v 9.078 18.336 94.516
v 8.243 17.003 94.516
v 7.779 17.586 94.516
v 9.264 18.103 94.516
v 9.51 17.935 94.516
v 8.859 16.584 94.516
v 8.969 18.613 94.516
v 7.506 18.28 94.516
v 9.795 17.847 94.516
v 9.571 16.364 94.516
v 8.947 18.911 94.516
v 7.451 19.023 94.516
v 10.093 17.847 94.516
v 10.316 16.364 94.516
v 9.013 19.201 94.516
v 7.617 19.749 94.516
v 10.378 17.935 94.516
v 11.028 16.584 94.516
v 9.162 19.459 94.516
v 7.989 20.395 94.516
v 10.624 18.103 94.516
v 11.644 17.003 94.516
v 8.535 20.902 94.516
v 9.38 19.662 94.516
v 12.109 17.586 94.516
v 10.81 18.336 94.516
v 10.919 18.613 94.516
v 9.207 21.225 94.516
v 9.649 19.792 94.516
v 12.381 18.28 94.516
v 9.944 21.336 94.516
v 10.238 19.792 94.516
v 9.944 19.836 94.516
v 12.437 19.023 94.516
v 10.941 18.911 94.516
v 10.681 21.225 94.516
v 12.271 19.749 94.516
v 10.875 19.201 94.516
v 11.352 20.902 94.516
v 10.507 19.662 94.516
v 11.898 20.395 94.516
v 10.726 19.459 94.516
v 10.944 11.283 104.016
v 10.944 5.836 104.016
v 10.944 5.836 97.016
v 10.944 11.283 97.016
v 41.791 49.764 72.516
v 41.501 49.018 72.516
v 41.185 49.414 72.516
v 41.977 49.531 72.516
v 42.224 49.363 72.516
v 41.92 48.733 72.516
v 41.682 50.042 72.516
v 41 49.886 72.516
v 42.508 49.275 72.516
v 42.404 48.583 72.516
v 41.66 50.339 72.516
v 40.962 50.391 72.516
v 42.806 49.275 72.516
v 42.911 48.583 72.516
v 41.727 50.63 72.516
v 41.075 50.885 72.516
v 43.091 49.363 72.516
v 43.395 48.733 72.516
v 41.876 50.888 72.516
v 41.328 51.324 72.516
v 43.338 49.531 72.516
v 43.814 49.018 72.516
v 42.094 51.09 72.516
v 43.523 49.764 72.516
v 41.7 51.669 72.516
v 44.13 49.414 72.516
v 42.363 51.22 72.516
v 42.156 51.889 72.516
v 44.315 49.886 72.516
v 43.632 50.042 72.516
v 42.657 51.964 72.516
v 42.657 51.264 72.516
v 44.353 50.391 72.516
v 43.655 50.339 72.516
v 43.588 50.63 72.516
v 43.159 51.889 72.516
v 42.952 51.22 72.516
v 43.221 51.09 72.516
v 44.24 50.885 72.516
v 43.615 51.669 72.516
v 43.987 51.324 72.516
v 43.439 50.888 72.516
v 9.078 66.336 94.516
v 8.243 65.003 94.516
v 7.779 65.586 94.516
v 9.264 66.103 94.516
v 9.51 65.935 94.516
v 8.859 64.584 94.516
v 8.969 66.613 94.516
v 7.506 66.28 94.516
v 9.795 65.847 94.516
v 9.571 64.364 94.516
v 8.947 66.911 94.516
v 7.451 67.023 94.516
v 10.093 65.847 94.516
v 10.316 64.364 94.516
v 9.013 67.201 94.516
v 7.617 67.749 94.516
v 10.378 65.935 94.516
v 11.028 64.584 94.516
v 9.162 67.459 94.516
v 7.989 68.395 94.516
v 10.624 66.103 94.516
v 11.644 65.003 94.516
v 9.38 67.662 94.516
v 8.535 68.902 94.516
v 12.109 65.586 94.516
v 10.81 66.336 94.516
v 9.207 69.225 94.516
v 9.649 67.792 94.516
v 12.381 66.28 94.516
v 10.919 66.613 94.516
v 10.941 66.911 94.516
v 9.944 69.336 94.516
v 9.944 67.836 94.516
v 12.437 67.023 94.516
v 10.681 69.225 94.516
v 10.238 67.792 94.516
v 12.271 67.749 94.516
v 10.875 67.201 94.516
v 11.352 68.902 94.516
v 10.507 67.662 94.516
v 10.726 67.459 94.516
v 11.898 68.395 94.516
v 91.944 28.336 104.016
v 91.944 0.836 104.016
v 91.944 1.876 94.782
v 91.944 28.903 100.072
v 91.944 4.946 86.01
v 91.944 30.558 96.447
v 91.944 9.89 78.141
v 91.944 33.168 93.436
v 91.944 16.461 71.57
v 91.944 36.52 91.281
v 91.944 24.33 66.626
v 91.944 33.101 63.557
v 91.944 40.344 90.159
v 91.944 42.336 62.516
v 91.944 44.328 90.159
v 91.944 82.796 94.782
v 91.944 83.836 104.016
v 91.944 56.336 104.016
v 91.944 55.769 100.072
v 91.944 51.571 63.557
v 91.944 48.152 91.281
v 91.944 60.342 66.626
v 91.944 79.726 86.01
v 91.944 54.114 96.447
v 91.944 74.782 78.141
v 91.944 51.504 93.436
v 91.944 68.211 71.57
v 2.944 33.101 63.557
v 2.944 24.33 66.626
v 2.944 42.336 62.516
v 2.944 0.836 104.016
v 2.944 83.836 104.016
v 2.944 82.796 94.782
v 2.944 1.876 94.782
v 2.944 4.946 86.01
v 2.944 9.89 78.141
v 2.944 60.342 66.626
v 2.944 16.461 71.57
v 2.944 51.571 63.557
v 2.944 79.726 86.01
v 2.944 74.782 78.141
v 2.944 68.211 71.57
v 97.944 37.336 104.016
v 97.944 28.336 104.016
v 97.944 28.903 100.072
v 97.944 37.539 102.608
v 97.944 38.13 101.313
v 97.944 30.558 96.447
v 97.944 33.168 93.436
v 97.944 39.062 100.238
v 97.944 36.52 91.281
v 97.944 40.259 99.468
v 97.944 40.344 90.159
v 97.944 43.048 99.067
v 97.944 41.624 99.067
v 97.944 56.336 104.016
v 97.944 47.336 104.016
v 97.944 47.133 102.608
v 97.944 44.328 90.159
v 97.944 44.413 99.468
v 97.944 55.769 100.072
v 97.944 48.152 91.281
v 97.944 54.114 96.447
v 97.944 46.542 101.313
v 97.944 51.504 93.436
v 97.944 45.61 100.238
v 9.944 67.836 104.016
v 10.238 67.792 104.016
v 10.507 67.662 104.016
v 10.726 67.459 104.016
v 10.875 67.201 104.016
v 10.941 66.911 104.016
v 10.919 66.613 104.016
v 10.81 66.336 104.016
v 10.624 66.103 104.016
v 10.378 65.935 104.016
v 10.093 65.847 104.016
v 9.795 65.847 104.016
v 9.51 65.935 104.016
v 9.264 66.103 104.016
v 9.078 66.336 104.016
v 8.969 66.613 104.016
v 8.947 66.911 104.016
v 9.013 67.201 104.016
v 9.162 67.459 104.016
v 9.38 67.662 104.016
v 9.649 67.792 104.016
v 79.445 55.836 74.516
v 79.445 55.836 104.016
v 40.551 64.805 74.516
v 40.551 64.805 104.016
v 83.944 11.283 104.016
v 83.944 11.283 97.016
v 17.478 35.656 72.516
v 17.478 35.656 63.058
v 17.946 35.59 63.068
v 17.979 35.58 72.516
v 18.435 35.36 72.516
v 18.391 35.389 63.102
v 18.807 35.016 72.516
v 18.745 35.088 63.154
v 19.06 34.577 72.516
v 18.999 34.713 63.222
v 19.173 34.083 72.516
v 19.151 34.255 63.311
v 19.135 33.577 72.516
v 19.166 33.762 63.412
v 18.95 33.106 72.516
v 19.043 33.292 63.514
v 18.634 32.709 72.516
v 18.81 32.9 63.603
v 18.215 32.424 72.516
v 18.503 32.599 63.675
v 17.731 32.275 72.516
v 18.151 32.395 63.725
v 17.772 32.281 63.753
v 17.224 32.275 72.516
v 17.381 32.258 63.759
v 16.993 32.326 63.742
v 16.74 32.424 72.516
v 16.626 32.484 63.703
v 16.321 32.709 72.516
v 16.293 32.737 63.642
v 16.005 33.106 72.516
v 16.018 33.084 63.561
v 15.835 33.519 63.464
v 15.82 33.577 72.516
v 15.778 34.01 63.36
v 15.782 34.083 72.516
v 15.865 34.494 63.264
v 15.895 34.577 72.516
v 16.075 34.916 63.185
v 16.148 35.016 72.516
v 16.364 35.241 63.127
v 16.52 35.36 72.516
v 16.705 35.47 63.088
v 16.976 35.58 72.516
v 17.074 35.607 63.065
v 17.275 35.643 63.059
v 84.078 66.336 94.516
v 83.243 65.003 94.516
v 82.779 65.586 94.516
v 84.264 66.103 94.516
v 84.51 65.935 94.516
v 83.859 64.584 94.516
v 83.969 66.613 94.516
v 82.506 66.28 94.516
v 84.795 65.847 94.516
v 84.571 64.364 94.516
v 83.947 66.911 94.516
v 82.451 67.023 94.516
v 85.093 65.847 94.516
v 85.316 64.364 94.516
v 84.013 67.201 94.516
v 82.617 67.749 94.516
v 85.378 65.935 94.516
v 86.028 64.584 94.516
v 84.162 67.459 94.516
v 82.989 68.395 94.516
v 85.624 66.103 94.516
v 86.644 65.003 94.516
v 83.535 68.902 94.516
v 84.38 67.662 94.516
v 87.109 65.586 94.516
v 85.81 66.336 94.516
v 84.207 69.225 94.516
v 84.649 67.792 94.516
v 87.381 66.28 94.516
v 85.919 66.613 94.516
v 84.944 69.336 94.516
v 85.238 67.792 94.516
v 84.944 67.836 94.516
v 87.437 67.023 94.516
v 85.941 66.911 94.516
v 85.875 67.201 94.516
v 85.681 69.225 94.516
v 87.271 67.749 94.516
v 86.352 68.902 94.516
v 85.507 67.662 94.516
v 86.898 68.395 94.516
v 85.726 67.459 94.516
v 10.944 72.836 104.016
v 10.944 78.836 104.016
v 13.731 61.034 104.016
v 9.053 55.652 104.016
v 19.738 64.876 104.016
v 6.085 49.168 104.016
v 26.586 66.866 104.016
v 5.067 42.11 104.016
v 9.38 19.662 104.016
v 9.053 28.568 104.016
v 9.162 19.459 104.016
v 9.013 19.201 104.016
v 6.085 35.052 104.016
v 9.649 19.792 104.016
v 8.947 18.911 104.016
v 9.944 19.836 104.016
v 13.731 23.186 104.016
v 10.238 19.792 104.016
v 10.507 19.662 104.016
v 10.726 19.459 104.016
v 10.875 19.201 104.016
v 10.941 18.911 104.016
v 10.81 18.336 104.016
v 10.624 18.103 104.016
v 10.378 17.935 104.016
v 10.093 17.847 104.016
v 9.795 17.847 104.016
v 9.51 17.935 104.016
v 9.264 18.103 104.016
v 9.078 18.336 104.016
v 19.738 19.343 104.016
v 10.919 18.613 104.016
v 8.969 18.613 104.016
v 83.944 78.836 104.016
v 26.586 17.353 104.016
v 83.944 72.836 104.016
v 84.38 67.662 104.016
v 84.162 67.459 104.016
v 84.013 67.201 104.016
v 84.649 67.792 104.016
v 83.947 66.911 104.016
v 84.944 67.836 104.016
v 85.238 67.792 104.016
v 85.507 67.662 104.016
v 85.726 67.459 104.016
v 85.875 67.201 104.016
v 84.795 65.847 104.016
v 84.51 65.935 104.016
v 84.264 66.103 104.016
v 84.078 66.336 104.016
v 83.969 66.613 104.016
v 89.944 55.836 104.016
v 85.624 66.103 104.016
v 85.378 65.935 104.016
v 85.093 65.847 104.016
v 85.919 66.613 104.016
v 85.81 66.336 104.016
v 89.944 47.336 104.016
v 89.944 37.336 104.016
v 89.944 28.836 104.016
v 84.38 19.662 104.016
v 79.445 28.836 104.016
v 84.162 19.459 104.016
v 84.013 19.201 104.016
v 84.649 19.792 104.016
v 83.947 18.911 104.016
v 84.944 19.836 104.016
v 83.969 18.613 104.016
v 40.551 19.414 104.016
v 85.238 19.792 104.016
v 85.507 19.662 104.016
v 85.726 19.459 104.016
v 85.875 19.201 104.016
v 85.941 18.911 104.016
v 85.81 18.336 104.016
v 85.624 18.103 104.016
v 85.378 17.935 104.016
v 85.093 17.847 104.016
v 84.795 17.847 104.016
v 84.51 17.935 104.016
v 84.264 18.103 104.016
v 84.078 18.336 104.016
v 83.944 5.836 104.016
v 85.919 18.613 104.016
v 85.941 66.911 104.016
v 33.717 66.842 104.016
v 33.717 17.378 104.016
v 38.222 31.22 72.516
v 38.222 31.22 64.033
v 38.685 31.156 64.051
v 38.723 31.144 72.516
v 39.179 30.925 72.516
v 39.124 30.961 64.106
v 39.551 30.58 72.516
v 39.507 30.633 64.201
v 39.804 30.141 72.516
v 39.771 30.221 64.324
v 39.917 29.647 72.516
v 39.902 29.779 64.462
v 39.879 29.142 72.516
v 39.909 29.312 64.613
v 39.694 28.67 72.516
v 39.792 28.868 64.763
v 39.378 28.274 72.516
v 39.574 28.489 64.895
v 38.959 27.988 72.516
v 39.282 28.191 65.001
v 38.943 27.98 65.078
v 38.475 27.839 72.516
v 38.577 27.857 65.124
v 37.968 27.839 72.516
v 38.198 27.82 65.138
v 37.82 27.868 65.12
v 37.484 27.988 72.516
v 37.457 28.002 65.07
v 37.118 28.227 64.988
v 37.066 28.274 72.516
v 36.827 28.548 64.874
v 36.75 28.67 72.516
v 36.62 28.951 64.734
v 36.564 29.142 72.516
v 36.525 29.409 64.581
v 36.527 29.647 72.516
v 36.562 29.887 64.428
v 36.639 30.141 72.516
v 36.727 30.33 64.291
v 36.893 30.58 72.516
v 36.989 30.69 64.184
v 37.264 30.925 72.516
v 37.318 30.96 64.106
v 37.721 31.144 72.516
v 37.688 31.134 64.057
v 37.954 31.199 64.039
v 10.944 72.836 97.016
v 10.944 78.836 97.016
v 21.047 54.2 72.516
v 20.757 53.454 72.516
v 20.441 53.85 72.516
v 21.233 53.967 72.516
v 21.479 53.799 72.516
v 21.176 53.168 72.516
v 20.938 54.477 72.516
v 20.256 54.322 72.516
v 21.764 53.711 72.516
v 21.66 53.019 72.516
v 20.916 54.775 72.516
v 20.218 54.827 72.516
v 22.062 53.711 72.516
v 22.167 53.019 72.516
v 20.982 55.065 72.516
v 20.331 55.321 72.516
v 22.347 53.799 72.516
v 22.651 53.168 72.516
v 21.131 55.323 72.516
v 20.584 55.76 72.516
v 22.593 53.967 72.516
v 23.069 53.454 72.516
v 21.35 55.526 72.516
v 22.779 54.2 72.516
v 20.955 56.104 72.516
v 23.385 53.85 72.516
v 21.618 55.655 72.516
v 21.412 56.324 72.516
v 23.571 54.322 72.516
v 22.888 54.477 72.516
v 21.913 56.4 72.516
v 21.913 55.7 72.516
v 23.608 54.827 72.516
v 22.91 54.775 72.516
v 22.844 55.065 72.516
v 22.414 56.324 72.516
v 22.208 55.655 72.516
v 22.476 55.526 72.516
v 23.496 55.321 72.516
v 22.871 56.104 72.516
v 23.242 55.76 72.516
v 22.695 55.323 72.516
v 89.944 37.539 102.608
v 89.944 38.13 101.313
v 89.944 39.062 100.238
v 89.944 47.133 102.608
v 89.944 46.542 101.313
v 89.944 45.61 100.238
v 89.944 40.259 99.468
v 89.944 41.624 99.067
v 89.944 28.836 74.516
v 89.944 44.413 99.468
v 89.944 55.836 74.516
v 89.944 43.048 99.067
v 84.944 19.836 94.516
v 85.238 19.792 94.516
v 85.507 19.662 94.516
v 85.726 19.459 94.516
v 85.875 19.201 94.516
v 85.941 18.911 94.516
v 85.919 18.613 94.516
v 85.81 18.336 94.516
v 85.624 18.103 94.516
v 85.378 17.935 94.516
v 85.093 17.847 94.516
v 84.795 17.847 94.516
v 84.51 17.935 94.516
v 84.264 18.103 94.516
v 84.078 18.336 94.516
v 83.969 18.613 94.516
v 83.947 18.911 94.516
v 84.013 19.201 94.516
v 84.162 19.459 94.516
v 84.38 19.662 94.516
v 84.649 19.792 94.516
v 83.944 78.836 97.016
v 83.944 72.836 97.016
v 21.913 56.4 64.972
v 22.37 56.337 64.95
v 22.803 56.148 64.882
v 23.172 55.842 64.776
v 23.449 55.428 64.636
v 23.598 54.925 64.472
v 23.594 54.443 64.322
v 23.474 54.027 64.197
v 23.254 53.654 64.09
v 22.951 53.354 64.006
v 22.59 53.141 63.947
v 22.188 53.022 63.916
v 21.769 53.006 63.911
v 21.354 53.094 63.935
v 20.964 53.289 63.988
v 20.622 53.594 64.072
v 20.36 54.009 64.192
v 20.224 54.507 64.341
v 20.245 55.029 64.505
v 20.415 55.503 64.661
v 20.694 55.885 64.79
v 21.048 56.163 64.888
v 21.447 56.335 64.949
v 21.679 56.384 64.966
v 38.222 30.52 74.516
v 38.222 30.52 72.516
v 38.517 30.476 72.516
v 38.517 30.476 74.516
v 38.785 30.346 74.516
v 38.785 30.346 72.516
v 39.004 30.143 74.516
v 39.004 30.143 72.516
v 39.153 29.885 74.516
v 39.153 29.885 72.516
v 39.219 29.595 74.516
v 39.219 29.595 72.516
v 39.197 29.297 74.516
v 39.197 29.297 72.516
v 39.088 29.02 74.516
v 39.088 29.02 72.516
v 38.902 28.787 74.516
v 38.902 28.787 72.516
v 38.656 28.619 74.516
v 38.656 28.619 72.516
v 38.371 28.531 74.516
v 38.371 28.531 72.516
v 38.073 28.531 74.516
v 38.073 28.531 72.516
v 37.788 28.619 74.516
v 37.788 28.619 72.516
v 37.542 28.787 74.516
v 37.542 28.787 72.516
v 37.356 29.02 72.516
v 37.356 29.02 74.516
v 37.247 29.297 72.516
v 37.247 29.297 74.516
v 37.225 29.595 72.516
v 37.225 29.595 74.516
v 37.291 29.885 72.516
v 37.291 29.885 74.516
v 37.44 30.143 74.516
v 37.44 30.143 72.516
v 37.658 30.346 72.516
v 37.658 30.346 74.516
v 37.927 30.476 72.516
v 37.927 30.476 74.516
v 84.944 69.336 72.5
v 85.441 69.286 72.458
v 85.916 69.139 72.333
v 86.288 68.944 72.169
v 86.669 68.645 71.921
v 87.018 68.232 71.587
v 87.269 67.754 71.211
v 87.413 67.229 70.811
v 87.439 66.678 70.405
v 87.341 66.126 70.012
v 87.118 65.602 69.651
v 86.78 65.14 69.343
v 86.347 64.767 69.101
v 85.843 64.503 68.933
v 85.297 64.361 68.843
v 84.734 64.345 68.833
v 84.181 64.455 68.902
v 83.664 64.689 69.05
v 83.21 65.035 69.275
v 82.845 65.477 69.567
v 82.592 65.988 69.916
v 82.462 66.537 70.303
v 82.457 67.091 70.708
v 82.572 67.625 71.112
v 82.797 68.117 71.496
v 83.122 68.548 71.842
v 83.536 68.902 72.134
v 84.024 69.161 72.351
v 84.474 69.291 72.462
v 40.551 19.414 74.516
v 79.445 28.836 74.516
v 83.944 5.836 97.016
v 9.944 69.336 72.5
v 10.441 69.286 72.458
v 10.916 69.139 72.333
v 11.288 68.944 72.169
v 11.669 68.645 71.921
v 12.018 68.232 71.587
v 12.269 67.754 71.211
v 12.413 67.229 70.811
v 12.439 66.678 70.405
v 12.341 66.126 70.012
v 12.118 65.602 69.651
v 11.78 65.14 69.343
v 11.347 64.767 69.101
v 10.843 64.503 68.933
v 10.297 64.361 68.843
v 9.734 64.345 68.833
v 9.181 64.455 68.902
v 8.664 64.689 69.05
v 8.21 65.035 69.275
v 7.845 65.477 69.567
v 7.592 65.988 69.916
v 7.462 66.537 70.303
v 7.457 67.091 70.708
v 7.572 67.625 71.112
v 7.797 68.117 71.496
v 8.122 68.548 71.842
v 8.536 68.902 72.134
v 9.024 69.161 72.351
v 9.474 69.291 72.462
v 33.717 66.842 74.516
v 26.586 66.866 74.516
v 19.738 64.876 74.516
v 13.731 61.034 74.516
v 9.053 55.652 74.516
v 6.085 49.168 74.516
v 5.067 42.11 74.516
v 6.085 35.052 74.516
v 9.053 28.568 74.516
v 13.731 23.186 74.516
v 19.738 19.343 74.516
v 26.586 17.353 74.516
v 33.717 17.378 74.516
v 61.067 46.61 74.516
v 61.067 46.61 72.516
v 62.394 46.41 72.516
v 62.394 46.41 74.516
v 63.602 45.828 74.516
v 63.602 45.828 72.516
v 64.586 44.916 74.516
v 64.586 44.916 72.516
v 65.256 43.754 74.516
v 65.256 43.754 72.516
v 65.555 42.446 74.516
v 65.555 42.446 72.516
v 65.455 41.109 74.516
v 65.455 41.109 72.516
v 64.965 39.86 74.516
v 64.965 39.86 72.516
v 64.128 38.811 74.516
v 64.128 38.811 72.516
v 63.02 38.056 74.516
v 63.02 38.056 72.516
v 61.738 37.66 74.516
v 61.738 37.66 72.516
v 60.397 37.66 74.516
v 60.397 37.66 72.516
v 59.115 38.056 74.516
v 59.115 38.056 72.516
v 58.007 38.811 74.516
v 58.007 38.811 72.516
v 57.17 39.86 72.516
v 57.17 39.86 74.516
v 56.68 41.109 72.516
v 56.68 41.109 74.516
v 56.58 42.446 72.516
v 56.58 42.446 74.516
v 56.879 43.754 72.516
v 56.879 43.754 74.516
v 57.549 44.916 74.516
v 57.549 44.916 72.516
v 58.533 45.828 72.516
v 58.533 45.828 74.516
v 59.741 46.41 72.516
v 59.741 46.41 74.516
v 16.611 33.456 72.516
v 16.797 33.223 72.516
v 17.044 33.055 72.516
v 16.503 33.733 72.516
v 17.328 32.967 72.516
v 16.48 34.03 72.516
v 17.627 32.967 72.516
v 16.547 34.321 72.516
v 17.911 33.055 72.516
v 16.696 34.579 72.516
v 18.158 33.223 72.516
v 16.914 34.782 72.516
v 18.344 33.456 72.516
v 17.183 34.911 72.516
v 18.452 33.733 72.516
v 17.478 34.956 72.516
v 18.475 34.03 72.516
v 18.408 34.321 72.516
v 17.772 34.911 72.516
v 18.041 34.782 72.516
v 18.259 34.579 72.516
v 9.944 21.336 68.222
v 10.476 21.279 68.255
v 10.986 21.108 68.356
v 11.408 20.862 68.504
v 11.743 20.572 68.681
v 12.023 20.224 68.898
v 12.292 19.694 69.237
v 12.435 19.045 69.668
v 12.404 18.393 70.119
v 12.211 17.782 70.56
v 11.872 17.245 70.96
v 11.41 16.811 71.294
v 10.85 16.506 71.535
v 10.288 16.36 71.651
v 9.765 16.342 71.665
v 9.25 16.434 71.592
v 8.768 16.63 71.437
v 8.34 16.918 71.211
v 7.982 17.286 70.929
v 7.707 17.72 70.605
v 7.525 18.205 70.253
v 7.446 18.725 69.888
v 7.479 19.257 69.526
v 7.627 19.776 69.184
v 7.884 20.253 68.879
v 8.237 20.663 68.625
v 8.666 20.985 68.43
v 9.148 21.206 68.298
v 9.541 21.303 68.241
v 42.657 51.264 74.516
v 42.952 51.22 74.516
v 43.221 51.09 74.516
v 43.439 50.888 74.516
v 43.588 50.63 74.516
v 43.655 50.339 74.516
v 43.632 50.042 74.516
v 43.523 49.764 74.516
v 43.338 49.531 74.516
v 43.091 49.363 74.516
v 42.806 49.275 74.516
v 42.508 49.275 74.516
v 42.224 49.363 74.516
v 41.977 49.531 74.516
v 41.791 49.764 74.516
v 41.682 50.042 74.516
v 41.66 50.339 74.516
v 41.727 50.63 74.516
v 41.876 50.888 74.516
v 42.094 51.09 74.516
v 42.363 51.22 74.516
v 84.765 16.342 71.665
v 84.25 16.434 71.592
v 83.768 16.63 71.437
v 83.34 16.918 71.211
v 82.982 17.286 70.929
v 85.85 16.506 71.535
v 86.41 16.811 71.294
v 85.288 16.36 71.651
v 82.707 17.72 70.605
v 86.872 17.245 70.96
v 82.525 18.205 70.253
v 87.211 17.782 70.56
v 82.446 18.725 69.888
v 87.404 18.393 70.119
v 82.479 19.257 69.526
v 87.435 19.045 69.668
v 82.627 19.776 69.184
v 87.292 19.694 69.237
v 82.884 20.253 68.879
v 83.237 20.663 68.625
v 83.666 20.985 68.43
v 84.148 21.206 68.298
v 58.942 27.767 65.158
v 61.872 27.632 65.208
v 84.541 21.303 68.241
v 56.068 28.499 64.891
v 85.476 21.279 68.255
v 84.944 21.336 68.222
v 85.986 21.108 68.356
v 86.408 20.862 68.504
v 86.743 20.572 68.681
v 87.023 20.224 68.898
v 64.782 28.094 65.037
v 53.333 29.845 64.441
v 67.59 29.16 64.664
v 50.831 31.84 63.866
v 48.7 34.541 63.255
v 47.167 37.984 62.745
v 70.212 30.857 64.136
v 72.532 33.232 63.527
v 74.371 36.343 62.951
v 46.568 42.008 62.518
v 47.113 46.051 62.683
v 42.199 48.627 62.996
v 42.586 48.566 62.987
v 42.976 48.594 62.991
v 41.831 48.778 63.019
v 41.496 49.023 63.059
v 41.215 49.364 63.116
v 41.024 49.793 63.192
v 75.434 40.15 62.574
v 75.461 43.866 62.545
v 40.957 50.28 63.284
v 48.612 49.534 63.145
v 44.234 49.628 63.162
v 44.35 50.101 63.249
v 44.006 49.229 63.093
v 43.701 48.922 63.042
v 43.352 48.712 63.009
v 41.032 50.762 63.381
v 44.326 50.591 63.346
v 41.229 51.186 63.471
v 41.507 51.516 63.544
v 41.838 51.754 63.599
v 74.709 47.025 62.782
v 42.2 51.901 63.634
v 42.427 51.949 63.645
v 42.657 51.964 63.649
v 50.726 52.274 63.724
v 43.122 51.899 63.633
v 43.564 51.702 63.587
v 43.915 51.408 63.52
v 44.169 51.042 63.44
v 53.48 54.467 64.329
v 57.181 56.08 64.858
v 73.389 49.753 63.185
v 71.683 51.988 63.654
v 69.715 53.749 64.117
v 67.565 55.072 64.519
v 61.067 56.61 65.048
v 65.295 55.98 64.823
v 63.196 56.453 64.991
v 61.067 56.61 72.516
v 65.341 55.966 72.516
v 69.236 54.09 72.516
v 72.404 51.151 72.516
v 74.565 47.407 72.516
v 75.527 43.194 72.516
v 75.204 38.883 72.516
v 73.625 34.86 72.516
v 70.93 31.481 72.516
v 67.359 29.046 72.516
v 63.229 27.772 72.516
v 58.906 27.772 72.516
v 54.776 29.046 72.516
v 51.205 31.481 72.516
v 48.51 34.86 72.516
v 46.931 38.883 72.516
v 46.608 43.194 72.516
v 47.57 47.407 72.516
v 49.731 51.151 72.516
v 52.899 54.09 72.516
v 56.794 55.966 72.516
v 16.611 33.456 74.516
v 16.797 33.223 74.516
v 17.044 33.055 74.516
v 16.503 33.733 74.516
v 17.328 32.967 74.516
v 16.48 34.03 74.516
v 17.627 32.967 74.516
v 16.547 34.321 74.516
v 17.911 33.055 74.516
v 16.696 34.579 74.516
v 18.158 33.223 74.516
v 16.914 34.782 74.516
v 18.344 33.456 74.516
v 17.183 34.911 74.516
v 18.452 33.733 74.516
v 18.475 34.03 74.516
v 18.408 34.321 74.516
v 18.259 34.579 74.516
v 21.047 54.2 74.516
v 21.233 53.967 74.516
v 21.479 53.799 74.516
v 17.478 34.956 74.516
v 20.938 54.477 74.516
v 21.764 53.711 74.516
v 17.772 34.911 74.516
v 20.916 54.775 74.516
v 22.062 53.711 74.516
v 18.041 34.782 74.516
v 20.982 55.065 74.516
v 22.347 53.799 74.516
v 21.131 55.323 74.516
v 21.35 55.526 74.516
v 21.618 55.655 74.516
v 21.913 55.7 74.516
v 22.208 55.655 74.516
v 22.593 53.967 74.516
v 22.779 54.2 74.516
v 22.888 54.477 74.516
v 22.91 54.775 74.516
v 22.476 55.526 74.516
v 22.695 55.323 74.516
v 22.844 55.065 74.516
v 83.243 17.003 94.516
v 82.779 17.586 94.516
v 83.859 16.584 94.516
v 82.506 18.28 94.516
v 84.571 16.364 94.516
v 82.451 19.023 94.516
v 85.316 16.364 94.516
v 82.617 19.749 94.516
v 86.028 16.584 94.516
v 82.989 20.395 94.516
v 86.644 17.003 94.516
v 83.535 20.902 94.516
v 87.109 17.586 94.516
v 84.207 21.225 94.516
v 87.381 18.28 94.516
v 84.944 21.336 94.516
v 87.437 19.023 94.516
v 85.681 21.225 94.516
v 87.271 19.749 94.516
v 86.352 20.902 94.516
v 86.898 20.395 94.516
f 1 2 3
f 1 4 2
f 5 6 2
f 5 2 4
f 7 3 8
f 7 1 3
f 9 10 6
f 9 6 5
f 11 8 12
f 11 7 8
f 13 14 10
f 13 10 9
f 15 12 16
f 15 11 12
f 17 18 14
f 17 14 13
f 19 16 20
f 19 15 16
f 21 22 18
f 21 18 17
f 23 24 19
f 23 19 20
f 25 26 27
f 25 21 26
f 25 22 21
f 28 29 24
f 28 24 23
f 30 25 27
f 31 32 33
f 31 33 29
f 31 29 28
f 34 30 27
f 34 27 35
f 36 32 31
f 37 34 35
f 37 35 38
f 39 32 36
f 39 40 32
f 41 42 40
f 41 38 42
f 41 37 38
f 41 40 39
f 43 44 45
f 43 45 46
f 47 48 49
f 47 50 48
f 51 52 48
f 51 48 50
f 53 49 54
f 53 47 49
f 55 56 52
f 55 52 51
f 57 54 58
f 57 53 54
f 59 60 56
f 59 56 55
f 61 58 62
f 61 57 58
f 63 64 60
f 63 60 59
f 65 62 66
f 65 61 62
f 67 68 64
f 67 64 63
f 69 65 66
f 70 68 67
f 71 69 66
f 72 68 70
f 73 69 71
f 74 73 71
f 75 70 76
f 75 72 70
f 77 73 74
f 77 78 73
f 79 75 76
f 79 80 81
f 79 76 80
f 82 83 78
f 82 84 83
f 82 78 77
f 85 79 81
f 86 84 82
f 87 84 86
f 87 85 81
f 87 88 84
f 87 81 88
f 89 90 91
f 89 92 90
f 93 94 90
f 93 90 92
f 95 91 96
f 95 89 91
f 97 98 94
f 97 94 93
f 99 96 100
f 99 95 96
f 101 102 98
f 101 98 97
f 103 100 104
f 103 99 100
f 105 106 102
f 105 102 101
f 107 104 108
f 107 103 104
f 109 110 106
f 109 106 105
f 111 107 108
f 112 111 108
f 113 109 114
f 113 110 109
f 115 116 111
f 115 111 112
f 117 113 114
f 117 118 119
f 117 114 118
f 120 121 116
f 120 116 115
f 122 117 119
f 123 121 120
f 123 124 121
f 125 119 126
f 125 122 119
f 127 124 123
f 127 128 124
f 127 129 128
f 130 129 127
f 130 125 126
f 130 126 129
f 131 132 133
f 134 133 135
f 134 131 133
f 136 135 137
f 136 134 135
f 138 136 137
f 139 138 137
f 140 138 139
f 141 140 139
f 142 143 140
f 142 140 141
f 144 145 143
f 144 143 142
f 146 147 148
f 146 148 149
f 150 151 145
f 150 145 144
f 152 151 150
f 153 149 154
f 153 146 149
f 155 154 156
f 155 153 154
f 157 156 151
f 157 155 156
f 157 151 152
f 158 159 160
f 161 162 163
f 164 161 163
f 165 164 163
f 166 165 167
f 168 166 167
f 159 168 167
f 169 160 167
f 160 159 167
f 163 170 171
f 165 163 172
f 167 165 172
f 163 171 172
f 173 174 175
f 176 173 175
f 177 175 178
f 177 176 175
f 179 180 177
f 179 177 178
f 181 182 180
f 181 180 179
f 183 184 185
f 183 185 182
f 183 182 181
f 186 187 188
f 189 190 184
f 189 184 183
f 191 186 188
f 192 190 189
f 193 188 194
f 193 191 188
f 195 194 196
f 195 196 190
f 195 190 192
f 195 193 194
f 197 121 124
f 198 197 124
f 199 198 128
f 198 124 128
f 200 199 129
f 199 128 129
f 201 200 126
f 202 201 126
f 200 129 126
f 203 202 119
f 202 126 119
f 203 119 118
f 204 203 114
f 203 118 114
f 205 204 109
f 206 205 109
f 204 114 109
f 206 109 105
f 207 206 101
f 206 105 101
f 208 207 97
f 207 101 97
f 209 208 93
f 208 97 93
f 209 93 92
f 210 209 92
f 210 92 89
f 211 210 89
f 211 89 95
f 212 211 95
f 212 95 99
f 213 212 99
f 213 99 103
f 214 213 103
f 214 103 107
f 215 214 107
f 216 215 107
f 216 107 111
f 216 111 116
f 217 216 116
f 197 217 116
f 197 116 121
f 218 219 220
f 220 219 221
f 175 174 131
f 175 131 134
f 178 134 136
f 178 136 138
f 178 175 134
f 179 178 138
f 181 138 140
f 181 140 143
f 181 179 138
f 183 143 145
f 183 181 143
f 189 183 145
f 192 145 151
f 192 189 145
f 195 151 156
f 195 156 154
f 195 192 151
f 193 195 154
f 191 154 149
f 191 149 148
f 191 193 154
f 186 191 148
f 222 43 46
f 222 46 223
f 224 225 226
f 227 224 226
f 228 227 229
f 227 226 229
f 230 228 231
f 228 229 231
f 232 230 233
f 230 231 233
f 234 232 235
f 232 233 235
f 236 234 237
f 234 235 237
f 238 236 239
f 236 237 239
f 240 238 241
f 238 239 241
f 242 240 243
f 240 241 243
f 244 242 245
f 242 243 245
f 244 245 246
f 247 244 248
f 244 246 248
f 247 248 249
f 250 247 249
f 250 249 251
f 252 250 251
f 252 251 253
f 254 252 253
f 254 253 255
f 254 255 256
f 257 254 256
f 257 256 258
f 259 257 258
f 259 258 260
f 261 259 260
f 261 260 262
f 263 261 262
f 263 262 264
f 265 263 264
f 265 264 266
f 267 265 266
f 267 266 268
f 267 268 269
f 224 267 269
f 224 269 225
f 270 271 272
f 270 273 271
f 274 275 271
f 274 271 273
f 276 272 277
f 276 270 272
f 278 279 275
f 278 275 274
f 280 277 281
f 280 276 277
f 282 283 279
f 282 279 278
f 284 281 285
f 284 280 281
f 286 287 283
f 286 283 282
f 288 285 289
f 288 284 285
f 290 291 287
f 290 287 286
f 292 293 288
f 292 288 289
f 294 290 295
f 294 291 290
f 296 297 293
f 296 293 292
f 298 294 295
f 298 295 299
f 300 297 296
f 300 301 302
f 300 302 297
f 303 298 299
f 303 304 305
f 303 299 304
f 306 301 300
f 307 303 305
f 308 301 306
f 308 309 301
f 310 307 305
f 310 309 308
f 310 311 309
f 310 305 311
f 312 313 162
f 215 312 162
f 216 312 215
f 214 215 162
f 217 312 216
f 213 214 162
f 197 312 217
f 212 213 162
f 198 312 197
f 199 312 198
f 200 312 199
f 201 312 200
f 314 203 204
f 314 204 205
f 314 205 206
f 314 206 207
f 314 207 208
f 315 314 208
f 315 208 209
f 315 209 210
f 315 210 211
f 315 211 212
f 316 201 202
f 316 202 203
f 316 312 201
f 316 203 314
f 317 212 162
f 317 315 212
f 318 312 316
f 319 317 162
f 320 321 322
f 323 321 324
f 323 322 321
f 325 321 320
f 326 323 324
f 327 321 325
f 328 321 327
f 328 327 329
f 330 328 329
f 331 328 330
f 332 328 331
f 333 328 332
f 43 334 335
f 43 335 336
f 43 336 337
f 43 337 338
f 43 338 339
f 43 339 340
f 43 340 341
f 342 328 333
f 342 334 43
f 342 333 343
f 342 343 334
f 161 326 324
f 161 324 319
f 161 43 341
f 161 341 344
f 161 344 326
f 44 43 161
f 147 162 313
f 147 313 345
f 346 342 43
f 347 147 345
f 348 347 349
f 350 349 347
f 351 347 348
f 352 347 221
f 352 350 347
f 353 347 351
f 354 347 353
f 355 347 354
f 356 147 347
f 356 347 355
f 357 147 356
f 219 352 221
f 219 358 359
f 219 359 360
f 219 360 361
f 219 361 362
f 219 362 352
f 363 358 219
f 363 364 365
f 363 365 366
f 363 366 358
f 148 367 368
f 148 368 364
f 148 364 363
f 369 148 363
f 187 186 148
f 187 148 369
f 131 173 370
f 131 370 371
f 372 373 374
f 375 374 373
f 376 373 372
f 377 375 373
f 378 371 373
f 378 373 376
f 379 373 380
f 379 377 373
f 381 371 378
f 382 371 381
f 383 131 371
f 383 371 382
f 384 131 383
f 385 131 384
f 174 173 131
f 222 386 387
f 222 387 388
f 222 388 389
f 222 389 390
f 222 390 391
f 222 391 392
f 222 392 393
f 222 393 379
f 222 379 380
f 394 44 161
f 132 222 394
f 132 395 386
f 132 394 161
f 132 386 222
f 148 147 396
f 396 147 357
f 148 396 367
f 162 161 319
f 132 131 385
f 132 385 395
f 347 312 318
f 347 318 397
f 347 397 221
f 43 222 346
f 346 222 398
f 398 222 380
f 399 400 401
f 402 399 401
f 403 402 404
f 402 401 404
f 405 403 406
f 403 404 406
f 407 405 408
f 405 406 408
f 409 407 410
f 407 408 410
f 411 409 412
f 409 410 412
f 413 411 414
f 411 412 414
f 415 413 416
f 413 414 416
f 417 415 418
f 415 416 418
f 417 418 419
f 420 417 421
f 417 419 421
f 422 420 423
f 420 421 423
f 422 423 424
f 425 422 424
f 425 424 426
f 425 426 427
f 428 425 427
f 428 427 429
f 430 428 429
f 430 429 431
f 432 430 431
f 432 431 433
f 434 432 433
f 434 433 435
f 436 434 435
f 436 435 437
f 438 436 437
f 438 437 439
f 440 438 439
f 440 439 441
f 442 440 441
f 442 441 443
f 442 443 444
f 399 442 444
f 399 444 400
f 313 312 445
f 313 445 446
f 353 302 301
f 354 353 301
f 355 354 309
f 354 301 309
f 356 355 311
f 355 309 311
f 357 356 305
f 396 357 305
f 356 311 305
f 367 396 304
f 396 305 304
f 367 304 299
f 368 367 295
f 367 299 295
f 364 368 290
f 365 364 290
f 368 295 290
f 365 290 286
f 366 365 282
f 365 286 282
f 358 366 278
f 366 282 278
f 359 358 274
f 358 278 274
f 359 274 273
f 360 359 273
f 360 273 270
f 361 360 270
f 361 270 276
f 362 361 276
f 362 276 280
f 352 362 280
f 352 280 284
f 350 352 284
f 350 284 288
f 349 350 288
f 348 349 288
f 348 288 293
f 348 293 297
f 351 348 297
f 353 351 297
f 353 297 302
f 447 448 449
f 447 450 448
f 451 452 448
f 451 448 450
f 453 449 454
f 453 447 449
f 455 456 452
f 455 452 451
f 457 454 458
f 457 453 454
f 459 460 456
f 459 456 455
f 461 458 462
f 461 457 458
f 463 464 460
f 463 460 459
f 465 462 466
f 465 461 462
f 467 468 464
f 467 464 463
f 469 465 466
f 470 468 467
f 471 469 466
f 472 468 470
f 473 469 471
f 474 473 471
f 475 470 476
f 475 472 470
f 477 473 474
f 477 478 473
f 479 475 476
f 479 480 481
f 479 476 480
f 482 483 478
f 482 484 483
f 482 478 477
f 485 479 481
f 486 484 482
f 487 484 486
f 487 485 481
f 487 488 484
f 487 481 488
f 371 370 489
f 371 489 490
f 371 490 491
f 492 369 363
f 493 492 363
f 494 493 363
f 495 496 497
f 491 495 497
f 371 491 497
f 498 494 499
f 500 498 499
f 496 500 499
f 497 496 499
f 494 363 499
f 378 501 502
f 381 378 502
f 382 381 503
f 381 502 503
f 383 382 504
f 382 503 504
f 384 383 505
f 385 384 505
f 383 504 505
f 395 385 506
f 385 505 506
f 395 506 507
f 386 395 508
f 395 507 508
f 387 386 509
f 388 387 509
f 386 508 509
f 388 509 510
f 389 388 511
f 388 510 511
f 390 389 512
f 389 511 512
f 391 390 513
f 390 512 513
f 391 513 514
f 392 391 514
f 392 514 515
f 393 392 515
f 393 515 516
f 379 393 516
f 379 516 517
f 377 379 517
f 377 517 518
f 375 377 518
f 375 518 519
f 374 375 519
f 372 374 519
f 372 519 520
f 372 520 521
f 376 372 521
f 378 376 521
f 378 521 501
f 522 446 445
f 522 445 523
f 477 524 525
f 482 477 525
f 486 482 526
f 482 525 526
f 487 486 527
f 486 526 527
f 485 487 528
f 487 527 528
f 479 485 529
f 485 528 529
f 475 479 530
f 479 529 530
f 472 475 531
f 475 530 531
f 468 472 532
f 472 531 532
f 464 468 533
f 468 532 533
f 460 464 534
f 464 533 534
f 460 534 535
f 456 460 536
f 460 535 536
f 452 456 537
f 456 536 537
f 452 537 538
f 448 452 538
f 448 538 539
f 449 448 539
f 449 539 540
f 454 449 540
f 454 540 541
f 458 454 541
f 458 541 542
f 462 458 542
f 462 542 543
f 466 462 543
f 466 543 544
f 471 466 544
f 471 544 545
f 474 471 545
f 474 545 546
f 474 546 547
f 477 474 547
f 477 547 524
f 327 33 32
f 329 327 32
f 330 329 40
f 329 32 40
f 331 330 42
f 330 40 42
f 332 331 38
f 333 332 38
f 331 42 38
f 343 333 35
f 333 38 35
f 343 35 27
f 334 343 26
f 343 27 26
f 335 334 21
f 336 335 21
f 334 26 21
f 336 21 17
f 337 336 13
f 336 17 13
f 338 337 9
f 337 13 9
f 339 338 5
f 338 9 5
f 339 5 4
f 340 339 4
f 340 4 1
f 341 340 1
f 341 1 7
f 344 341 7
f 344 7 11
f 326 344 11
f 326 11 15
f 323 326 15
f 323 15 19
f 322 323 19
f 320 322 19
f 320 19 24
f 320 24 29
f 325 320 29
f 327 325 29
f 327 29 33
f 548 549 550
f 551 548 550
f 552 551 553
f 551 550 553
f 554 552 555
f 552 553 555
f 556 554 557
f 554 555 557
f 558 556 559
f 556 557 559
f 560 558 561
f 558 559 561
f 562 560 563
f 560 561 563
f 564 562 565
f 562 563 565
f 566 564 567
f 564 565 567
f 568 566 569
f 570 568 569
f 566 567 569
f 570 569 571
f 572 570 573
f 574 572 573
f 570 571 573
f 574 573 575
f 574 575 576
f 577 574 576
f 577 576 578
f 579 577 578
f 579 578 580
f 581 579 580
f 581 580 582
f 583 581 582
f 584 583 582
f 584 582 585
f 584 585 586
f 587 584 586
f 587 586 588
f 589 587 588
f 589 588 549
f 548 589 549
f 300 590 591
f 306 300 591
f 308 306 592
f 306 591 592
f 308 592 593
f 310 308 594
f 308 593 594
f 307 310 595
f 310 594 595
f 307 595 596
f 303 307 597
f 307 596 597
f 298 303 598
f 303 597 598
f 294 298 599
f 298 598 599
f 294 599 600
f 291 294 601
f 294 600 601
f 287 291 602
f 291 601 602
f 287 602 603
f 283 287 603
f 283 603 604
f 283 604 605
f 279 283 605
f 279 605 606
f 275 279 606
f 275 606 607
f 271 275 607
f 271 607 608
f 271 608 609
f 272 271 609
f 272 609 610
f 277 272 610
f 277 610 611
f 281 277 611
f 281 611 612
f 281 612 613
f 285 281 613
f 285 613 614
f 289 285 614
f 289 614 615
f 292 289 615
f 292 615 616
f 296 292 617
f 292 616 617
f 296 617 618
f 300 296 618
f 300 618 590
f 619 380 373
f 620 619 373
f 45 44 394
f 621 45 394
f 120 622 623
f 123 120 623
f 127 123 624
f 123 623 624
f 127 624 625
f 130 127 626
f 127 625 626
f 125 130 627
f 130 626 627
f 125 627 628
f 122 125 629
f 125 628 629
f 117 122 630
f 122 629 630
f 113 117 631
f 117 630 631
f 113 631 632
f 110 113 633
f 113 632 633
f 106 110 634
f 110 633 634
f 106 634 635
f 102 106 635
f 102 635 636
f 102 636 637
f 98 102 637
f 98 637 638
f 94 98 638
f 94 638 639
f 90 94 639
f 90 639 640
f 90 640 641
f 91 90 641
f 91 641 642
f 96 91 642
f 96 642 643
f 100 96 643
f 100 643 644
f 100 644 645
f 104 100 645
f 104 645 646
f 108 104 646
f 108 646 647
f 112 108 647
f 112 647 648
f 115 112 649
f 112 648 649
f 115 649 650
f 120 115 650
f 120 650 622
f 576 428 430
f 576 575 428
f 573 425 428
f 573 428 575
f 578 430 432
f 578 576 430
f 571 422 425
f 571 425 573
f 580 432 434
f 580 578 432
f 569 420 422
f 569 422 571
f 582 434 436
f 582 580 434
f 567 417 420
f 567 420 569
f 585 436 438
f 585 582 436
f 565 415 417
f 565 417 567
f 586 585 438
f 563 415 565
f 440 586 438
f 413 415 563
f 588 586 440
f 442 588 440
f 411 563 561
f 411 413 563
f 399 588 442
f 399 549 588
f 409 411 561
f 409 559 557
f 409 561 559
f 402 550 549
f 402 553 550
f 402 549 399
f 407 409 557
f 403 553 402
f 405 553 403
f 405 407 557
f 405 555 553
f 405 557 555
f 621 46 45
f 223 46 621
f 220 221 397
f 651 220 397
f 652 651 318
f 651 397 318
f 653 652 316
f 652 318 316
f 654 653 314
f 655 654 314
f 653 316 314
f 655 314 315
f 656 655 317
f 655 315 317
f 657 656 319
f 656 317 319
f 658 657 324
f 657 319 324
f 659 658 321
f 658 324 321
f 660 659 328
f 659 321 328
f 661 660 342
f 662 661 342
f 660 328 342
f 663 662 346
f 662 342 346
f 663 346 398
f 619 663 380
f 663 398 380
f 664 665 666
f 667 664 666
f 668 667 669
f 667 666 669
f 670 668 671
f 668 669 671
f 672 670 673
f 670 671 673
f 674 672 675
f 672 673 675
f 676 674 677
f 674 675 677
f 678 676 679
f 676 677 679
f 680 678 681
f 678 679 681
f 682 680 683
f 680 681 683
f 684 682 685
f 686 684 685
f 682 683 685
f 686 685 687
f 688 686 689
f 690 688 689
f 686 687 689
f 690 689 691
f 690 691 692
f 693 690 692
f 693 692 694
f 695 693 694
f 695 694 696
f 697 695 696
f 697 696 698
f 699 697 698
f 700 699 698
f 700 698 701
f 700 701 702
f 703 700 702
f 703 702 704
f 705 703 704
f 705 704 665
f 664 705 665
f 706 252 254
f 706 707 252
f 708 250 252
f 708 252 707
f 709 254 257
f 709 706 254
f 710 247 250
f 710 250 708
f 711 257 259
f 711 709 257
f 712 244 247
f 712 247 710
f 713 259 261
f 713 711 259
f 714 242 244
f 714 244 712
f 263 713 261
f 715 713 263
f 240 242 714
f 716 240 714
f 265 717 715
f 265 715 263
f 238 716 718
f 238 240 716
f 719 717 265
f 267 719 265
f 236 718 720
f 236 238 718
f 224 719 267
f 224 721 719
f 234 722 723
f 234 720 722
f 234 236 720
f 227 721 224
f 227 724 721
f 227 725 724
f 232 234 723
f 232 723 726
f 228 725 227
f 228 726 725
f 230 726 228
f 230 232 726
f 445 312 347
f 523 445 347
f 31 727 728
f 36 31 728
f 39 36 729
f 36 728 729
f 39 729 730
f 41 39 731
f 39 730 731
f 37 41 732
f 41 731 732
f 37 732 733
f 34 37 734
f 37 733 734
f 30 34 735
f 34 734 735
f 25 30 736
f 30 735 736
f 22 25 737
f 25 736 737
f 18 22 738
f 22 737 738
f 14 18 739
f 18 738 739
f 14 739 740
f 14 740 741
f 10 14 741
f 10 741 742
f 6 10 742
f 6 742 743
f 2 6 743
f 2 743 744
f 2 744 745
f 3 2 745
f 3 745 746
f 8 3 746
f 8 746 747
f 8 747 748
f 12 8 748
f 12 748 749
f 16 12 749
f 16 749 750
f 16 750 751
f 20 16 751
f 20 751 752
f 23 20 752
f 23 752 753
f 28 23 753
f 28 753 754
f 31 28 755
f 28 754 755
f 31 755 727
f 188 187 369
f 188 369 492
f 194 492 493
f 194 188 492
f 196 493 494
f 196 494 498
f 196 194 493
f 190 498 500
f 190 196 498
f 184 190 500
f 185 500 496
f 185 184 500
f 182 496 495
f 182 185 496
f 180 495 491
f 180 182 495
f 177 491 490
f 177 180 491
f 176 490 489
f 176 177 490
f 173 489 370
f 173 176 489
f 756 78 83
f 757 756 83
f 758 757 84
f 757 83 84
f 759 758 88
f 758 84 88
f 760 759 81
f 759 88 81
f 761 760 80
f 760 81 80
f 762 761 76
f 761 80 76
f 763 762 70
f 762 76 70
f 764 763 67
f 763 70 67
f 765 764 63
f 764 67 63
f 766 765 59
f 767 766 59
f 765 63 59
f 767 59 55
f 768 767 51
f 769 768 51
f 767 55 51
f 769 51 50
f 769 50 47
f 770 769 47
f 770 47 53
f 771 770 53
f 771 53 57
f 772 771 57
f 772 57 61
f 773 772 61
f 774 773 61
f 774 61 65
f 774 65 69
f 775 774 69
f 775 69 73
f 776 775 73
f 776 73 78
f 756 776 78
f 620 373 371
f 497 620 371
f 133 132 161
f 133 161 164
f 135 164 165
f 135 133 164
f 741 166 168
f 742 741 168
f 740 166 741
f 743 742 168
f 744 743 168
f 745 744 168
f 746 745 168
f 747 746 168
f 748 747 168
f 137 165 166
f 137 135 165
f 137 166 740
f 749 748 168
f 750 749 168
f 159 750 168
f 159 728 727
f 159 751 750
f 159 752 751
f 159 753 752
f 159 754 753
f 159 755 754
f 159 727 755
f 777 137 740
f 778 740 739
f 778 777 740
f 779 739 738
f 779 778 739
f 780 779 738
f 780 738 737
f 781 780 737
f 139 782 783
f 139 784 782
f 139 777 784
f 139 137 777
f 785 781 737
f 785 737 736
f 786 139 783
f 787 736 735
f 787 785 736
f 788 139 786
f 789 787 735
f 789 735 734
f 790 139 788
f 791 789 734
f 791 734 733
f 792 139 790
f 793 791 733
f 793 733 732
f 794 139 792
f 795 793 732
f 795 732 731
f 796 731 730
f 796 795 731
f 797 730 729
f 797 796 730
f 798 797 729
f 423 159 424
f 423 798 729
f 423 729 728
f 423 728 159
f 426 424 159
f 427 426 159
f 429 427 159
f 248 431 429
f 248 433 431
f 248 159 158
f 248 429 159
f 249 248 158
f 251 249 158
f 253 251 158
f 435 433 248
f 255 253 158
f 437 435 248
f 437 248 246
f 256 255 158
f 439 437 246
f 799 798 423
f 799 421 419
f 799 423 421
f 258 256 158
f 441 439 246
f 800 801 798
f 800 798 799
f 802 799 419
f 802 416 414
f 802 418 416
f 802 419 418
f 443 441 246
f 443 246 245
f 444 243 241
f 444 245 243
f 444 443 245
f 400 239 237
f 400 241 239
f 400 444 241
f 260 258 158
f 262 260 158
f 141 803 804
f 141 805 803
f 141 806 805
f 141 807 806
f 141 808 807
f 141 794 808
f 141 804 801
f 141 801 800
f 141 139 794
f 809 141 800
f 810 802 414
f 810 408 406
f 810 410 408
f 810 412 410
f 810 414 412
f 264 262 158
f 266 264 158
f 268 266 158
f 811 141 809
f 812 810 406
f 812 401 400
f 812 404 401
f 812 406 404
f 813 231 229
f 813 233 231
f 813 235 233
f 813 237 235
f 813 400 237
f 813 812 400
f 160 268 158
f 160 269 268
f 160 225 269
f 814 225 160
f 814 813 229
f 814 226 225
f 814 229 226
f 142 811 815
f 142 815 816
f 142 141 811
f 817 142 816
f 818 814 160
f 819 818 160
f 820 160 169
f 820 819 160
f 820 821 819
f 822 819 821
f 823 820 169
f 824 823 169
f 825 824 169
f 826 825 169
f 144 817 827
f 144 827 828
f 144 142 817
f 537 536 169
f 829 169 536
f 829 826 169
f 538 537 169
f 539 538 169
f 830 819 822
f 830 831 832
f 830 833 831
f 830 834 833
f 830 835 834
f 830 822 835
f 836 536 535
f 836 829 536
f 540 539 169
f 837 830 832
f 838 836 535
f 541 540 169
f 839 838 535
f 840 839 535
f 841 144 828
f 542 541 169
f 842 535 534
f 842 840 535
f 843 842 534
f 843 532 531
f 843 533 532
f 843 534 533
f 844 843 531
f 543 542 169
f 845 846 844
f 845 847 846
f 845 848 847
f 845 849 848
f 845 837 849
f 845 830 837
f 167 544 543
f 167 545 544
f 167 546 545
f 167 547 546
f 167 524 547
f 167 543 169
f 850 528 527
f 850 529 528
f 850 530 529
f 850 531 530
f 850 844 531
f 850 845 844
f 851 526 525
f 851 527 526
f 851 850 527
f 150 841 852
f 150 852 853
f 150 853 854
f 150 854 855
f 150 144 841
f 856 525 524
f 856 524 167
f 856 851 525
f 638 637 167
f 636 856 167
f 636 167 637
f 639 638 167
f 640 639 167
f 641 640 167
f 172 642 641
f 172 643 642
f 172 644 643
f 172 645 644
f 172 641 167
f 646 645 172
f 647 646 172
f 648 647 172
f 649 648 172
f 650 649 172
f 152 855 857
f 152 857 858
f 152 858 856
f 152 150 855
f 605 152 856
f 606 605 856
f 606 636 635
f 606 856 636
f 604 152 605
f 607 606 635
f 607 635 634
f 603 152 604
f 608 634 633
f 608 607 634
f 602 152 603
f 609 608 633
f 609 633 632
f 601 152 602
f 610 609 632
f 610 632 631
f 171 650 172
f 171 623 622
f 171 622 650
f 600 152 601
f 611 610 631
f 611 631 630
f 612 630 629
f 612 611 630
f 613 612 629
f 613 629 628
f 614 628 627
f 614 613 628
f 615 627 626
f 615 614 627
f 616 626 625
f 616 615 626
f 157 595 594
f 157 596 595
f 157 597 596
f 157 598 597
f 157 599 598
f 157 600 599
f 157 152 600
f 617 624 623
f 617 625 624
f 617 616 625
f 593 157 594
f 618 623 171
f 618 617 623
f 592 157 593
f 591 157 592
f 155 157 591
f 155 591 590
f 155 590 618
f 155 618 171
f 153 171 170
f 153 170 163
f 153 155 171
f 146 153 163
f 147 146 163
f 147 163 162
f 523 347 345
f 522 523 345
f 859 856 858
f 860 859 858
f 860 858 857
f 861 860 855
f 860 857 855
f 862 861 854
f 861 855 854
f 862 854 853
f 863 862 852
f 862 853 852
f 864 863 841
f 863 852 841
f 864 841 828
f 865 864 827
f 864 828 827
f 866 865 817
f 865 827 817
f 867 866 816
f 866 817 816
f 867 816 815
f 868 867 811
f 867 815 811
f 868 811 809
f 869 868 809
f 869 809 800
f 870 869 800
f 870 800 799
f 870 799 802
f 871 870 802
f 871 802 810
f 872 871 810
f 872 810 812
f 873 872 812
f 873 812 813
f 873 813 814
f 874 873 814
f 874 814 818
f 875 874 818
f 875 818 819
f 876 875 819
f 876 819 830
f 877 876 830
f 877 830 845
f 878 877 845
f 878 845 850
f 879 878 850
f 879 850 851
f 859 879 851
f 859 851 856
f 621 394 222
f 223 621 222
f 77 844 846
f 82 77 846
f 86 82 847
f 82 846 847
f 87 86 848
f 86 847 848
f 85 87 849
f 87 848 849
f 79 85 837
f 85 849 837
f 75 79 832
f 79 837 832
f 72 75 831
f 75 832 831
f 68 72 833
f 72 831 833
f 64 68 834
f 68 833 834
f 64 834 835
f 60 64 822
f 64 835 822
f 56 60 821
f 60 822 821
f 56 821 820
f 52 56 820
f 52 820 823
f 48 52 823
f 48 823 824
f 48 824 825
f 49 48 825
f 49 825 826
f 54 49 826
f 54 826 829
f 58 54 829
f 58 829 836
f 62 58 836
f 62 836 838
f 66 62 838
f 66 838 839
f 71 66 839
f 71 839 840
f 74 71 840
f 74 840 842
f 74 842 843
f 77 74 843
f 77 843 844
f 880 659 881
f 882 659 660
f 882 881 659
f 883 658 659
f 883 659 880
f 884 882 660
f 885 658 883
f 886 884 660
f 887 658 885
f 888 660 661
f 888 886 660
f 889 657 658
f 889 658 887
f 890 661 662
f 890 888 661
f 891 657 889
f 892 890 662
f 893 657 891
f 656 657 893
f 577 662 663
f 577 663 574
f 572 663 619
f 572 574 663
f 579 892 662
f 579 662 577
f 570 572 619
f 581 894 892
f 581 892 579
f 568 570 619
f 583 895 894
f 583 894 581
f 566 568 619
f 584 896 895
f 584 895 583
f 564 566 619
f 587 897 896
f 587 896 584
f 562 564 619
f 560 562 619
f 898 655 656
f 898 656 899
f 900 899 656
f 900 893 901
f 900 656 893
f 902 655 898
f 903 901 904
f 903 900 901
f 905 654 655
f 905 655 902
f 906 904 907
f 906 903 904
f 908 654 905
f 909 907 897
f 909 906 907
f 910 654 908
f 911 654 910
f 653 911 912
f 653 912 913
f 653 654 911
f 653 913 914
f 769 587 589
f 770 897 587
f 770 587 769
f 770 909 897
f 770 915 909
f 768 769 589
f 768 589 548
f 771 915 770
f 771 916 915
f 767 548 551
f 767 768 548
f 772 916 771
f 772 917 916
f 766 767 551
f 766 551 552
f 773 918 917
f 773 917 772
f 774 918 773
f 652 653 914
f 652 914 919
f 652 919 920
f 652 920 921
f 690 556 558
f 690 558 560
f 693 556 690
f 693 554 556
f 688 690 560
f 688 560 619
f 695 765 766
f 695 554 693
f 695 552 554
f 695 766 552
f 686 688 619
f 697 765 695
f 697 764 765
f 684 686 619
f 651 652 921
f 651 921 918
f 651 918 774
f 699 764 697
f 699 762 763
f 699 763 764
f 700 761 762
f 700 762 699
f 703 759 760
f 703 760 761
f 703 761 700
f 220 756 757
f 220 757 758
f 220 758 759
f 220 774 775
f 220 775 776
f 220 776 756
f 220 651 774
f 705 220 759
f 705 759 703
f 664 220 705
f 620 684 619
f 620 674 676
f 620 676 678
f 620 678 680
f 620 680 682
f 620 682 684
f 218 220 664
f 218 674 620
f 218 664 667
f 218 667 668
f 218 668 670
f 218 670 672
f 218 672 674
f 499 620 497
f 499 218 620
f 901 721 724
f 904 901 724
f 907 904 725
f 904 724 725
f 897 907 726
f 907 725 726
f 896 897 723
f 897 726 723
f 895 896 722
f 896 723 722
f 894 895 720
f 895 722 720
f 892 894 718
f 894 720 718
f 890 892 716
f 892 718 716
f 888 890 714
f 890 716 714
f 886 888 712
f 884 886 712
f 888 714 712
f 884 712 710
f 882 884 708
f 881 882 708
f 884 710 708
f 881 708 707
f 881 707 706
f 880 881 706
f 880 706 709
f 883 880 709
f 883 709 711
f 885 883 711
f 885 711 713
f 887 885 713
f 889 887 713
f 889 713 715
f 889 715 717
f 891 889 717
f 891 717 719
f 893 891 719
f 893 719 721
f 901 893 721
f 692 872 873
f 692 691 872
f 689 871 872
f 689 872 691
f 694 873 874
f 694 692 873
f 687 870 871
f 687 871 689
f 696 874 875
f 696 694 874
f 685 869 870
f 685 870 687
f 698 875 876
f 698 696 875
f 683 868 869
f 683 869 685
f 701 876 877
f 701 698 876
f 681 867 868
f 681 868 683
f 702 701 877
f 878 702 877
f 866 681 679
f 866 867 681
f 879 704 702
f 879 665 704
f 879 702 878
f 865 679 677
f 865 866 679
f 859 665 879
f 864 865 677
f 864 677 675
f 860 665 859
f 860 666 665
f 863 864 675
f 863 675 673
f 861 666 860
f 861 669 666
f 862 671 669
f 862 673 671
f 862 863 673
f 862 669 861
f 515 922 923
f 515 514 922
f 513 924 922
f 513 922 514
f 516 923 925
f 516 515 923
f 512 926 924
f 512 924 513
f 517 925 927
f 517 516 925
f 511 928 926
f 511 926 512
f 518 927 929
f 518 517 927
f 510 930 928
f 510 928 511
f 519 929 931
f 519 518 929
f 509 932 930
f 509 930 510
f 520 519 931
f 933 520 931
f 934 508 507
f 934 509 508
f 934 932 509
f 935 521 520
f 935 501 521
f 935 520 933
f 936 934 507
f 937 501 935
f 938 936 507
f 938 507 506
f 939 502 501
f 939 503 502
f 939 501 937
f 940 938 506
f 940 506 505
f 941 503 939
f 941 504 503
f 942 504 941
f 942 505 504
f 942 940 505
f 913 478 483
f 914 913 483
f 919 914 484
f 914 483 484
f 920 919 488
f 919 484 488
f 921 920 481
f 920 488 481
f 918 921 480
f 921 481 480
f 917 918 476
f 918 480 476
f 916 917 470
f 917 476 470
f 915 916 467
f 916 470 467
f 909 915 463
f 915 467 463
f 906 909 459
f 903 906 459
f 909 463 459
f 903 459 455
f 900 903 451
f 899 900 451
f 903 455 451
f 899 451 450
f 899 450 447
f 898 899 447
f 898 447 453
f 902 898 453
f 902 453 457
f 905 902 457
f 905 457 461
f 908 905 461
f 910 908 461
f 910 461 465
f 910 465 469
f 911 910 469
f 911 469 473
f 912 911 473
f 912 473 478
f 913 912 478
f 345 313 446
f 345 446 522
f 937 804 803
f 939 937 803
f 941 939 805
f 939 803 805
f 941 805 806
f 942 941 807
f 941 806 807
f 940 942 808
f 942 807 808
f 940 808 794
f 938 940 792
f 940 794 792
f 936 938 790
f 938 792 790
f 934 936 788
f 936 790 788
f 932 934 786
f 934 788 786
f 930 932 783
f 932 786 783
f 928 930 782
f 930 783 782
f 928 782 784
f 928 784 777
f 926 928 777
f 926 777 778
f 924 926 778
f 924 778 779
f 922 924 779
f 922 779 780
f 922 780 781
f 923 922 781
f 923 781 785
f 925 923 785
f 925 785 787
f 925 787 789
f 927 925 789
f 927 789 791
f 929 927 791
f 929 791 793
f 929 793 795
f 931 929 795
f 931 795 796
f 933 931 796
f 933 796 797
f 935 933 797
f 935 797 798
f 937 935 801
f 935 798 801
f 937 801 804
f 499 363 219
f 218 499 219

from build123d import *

# Parameters (mm, degrees)
BOSS_EXTRUDE2_DEPTH = 87
CUT_EXTRUDE1_DEPTH  = 29.5
SKETCH3_R           = 4.5
SKETCH3_R_2         = 1
CUT_EXTRUDE2_DEPTH  = 130.771336418
SKETCH4_R           = 14.5
SKETCH4_R_2         = 1.7
CUT_EXTRUDE3_DEPTH  = 10
BOSS_EXTRUDE3_START = 2
BOSS_EXTRUDE3_DEPTH = 2
BOSS_EXTRUDE4_START = 6
BOSS_EXTRUDE4_DEPTH = 6
SKETCH7_W           = 73
SKETCH7_H           = 6
SKETCH7_H_2         = 5.446782016
CUT_EXTRUDE4_DEPTH  = 7
SKETCH8_R           = 1
CUT_EXTRUDE5_DEPTH  = 136.438914135
SKETCH9_R           = 2.5
CUT_EXTRUDE6_DEPTH  = 32


with BuildPart() as part:
    # Sketch1 → Boss-Extrude2 (new body)
    with BuildSketch(Plane(origin=(89.94373008, 0, 0), x_dir=(0, 0, -1), z_dir=(1, 0, 0))):
        with BuildLine():
            Line((-104.016306216, 83.836001664), (-104.016306216, 0.836001664))
            ThreePointArc((-104.016306216, 0.836001664), (-62.516306216, 42.336001664), (-104.016306216, 83.836001664))
        make_face()
    extrude(amount=-BOSS_EXTRUDE2_DEPTH)

    # Sketch2 → Cut-Extrude1 (cut)
    with BuildSketch(Plane.XY.offset(104.016306216)):
        with BuildLine():
            Line((89.94373008, 55.836001595), (79.445092487, 55.836001664))
            Line((79.445092487, 55.836001664), (40.551337791, 64.805487997))
            ThreePointArc((40.551337791, 64.805487997), (5.067466824, 42.109927869), (40.551337791, 19.414367741))
            Line((40.551337791, 19.414367741), (79.445092487, 28.836001664))
            Line((79.445092487, 28.836001664), (89.94373008, 28.836001664))
            Line((89.94373008, 28.836001664), (89.94373008, 55.836001595))
        make_face()
    extrude(amount=-CUT_EXTRUDE1_DEPTH, mode=Mode.SUBTRACT)

    # Sketch3 → Cut-Extrude2 (cut, through all)
    with BuildSketch(Plane(origin=(0, 0, 62.516306216), x_dir=(-1, 0, 0), z_dir=(0, 0, -1))):
        with Locations(Location((-61.067466824, 42.109927869, 0), (0, 0, 90))):
            Circle(SKETCH3_R)
        with Locations(Location((-42.657418818, 50.264258545, 0), (0, 0, 90))):
            Circle(SKETCH3_R_2)
        with Locations(Location((-21.913136148, 54.699879864, 0), (0, 0, 90))):
            Circle(SKETCH3_R_2)
        with Locations(Location((-38.2217975, 29.519975875, 0), (0, 0, 90))):
            Circle(SKETCH3_R_2)
        with Locations(Location((-17.477514829, 33.955597193, 0), (0, 0, 90))):
            Circle(SKETCH3_R_2)
    extrude(amount=-CUT_EXTRUDE2_DEPTH, mode=Mode.SUBTRACT)

    # Sketch4 → Cut-Extrude3 (cut)
    with BuildSketch(Plane(origin=(0, 0, 62.516306216), x_dir=(-1, 0, 0), z_dir=(0, 0, -1))):
        with Locations(Location((-61.067466824, 42.109927869, 0), (0, 0, 90))):
            Circle(SKETCH4_R)
        with Locations(Location((-42.657418818, 50.264258545, 0), (0, 0, 90))):
            Circle(SKETCH4_R_2)
        with Locations(Location((-21.913136148, 54.699879864, 0), (0, 0, 90))):
            Circle(SKETCH4_R_2)
        with Locations(Location((-38.2217975, 29.519975875, 0), (0, 0, 90))):
            Circle(SKETCH4_R_2)
        with Locations(Location((-17.477514829, 33.955597193, 0), (0, 0, 90))):
            Circle(SKETCH4_R_2)
    extrude(amount=-CUT_EXTRUDE3_DEPTH, mode=Mode.SUBTRACT)

    # Sketch5 → Boss-Extrude3 (add)
    with BuildSketch(Plane(origin=(89.94373008, 0, 0), x_dir=(0, 0, -1), z_dir=(1, 0, 0)).offset(BOSS_EXTRUDE3_START)):
        with BuildLine():
            Line((-104.016306216, 55.836001595), (-104.016306216, 47.336001664))
            ThreePointArc((-104.016306216, 47.336001664), (-99.016306216, 42.336001664), (-104.016306216, 37.336001664))
            Line((-104.016306216, 37.336001664), (-104.016306216, 28.836001664))
            Line((-104.016306216, 28.836001664), (-104.016306216, 0.836001664))
            ThreePointArc((-104.016306216, 0.836001664), (-62.516306216, 42.336001664), (-104.016306216, 83.836001664))
            Line((-104.016306216, 83.836001664), (-104.016306216, 55.836001595))
        make_face()
    extrude(amount=-BOSS_EXTRUDE3_DEPTH)

    # Sketch6 → Boss-Extrude4 (add)
    with BuildSketch(Plane(origin=(91.94373008, 0, 0), x_dir=(0, 0, -1), z_dir=(1, 0, 0)).offset(BOSS_EXTRUDE4_START)):
        with BuildLine():
            Line((-104.016306216, 56.336001664), (-104.016306216, 47.336001664))
            ThreePointArc((-104.016306216, 47.336001664), (-99.016306216, 42.336001664), (-104.016306216, 37.336001664))
            Line((-104.016306216, 37.336001664), (-104.016306216, 28.336001664))
            ThreePointArc((-104.016306216, 28.336001664), (-90.016306216, 42.336001664), (-104.016306216, 56.336001664))
        make_face()
    extrude(amount=-BOSS_EXTRUDE4_DEPTH)

    # Sketch7 → Cut-Extrude4 (cut)
    with BuildSketch(Plane.XY.offset(104.016306216)):
        with Locations((47.44373008, 75.836001664)):
            Rectangle(SKETCH7_W, SKETCH7_H)
        with Locations((47.44373008, 8.559392672)):
            Rectangle(SKETCH7_W, SKETCH7_H_2)
    extrude(amount=-CUT_EXTRUDE4_DEPTH, mode=Mode.SUBTRACT)

    # Sketch8 → Cut-Extrude5 (cut, through all)
    with BuildSketch(Plane(origin=(0, 0, 62.516306216), x_dir=(-1, 0, 0), z_dir=(0, 0, -1))):
        with Locations(Location((-84.94373008, 66.836001664, 0), (0, 0, 90))):
            Circle(SKETCH8_R)
        with Locations(Location((-84.94373008, 18.836001664, 0), (0, 0, 90))):
            Circle(SKETCH8_R)
        with Locations(Location((-9.94373008, 66.836001664, 0), (0, 0, 90))):
            Circle(SKETCH8_R)
        with Locations(Location((-9.94373008, 18.836001664, 0), (0, 0, 90))):
            Circle(SKETCH8_R)
    extrude(amount=-CUT_EXTRUDE5_DEPTH, mode=Mode.SUBTRACT)

    # Sketch9 → Cut-Extrude6 (cut)
    with BuildSketch(Plane(origin=(0, 0, 62.516306216), x_dir=(-1, 0, 0), z_dir=(0, 0, -1))):
        with Locations(Location((-84.94373008, 66.836001664, 0), (0, 0, 90))):
            Circle(SKETCH9_R)
        with Locations(Location((-84.94373008, 18.836001664, 0), (0, 0, 90))):
            Circle(SKETCH9_R)
        with Locations(Location((-9.94373008, 66.836001664, 0), (0, 0, 90))):
            Circle(SKETCH9_R)
        with Locations(Location((-9.94373008, 18.836001664, 0), (0, 0, 90))):
            Circle(SKETCH9_R)
    extrude(amount=-CUT_EXTRUDE6_DEPTH, mode=Mode.SUBTRACT)


solid = part.part
